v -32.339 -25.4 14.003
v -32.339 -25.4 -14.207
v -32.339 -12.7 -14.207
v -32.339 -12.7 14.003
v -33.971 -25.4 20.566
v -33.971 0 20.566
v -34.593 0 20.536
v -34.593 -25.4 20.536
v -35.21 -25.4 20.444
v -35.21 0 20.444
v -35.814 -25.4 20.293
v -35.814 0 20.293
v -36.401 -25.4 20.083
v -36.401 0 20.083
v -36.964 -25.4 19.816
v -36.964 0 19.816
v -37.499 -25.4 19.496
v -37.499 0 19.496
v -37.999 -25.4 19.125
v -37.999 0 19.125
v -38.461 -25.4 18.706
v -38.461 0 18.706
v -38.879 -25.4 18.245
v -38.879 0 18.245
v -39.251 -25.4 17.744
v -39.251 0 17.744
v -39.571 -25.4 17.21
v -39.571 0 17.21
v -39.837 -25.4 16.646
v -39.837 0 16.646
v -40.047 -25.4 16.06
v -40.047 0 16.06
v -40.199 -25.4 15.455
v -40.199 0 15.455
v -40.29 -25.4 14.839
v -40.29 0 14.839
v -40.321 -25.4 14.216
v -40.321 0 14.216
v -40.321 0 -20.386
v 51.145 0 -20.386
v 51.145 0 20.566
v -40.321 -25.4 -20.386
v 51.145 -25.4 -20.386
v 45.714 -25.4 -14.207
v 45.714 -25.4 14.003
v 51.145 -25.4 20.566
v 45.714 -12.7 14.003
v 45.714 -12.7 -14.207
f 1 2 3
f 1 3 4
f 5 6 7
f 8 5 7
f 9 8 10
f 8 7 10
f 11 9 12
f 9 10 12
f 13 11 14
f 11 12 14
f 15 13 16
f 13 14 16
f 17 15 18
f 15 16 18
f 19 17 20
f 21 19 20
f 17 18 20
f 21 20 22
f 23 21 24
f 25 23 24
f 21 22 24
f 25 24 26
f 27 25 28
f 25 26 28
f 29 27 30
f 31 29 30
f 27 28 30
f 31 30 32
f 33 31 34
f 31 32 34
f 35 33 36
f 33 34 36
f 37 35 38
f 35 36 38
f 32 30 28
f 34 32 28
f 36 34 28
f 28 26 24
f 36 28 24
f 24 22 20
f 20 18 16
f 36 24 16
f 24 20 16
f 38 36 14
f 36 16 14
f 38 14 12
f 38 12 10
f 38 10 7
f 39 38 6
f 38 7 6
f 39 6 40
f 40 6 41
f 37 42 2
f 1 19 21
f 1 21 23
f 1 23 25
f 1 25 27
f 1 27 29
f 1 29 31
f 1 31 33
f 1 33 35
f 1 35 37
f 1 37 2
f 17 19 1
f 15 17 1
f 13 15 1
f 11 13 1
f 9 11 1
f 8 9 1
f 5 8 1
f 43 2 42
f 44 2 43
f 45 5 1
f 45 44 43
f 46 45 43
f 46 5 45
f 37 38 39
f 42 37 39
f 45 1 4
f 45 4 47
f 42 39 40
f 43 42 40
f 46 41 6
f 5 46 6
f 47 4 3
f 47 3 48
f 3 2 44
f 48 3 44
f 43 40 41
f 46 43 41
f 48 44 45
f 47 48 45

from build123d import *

# Parameters (mm, degrees)
F1_DEPTH = 25.4
F2_W     = 78.052774
F2_H     = 28.209937
F3_DEPTH = 12.7


with BuildPart() as f1:
    # F0 (on Front) → F1 (new body)
    with BuildSketch(Plane.XZ):
        with BuildLine():
            Line((51.145062, 20.566268), (-33.970713, 20.566268))
            ThreePointArc((-33.970713, 20.566268), (-38.460841, 18.706396), (-40.320713, 14.216268))
            Line((-40.320713, 14.216268), (-40.320713, -20.385863))
            Line((-40.320713, -20.385863), (51.145062, -20.385863))
            Line((51.145062, -20.385863), (51.145062, 20.566268))
        make_face()
    extrude(amount=F1_DEPTH)

    # F2 (on face) → F3 (cut)
    with BuildSketch(Plane.XZ.offset(25.4)):
        with Locations((6.687261, -0.101787)):
            Rectangle(F2_W, F2_H)
    extrude(amount=-F3_DEPTH, mode=Mode.SUBTRACT)


solid = f1.part
